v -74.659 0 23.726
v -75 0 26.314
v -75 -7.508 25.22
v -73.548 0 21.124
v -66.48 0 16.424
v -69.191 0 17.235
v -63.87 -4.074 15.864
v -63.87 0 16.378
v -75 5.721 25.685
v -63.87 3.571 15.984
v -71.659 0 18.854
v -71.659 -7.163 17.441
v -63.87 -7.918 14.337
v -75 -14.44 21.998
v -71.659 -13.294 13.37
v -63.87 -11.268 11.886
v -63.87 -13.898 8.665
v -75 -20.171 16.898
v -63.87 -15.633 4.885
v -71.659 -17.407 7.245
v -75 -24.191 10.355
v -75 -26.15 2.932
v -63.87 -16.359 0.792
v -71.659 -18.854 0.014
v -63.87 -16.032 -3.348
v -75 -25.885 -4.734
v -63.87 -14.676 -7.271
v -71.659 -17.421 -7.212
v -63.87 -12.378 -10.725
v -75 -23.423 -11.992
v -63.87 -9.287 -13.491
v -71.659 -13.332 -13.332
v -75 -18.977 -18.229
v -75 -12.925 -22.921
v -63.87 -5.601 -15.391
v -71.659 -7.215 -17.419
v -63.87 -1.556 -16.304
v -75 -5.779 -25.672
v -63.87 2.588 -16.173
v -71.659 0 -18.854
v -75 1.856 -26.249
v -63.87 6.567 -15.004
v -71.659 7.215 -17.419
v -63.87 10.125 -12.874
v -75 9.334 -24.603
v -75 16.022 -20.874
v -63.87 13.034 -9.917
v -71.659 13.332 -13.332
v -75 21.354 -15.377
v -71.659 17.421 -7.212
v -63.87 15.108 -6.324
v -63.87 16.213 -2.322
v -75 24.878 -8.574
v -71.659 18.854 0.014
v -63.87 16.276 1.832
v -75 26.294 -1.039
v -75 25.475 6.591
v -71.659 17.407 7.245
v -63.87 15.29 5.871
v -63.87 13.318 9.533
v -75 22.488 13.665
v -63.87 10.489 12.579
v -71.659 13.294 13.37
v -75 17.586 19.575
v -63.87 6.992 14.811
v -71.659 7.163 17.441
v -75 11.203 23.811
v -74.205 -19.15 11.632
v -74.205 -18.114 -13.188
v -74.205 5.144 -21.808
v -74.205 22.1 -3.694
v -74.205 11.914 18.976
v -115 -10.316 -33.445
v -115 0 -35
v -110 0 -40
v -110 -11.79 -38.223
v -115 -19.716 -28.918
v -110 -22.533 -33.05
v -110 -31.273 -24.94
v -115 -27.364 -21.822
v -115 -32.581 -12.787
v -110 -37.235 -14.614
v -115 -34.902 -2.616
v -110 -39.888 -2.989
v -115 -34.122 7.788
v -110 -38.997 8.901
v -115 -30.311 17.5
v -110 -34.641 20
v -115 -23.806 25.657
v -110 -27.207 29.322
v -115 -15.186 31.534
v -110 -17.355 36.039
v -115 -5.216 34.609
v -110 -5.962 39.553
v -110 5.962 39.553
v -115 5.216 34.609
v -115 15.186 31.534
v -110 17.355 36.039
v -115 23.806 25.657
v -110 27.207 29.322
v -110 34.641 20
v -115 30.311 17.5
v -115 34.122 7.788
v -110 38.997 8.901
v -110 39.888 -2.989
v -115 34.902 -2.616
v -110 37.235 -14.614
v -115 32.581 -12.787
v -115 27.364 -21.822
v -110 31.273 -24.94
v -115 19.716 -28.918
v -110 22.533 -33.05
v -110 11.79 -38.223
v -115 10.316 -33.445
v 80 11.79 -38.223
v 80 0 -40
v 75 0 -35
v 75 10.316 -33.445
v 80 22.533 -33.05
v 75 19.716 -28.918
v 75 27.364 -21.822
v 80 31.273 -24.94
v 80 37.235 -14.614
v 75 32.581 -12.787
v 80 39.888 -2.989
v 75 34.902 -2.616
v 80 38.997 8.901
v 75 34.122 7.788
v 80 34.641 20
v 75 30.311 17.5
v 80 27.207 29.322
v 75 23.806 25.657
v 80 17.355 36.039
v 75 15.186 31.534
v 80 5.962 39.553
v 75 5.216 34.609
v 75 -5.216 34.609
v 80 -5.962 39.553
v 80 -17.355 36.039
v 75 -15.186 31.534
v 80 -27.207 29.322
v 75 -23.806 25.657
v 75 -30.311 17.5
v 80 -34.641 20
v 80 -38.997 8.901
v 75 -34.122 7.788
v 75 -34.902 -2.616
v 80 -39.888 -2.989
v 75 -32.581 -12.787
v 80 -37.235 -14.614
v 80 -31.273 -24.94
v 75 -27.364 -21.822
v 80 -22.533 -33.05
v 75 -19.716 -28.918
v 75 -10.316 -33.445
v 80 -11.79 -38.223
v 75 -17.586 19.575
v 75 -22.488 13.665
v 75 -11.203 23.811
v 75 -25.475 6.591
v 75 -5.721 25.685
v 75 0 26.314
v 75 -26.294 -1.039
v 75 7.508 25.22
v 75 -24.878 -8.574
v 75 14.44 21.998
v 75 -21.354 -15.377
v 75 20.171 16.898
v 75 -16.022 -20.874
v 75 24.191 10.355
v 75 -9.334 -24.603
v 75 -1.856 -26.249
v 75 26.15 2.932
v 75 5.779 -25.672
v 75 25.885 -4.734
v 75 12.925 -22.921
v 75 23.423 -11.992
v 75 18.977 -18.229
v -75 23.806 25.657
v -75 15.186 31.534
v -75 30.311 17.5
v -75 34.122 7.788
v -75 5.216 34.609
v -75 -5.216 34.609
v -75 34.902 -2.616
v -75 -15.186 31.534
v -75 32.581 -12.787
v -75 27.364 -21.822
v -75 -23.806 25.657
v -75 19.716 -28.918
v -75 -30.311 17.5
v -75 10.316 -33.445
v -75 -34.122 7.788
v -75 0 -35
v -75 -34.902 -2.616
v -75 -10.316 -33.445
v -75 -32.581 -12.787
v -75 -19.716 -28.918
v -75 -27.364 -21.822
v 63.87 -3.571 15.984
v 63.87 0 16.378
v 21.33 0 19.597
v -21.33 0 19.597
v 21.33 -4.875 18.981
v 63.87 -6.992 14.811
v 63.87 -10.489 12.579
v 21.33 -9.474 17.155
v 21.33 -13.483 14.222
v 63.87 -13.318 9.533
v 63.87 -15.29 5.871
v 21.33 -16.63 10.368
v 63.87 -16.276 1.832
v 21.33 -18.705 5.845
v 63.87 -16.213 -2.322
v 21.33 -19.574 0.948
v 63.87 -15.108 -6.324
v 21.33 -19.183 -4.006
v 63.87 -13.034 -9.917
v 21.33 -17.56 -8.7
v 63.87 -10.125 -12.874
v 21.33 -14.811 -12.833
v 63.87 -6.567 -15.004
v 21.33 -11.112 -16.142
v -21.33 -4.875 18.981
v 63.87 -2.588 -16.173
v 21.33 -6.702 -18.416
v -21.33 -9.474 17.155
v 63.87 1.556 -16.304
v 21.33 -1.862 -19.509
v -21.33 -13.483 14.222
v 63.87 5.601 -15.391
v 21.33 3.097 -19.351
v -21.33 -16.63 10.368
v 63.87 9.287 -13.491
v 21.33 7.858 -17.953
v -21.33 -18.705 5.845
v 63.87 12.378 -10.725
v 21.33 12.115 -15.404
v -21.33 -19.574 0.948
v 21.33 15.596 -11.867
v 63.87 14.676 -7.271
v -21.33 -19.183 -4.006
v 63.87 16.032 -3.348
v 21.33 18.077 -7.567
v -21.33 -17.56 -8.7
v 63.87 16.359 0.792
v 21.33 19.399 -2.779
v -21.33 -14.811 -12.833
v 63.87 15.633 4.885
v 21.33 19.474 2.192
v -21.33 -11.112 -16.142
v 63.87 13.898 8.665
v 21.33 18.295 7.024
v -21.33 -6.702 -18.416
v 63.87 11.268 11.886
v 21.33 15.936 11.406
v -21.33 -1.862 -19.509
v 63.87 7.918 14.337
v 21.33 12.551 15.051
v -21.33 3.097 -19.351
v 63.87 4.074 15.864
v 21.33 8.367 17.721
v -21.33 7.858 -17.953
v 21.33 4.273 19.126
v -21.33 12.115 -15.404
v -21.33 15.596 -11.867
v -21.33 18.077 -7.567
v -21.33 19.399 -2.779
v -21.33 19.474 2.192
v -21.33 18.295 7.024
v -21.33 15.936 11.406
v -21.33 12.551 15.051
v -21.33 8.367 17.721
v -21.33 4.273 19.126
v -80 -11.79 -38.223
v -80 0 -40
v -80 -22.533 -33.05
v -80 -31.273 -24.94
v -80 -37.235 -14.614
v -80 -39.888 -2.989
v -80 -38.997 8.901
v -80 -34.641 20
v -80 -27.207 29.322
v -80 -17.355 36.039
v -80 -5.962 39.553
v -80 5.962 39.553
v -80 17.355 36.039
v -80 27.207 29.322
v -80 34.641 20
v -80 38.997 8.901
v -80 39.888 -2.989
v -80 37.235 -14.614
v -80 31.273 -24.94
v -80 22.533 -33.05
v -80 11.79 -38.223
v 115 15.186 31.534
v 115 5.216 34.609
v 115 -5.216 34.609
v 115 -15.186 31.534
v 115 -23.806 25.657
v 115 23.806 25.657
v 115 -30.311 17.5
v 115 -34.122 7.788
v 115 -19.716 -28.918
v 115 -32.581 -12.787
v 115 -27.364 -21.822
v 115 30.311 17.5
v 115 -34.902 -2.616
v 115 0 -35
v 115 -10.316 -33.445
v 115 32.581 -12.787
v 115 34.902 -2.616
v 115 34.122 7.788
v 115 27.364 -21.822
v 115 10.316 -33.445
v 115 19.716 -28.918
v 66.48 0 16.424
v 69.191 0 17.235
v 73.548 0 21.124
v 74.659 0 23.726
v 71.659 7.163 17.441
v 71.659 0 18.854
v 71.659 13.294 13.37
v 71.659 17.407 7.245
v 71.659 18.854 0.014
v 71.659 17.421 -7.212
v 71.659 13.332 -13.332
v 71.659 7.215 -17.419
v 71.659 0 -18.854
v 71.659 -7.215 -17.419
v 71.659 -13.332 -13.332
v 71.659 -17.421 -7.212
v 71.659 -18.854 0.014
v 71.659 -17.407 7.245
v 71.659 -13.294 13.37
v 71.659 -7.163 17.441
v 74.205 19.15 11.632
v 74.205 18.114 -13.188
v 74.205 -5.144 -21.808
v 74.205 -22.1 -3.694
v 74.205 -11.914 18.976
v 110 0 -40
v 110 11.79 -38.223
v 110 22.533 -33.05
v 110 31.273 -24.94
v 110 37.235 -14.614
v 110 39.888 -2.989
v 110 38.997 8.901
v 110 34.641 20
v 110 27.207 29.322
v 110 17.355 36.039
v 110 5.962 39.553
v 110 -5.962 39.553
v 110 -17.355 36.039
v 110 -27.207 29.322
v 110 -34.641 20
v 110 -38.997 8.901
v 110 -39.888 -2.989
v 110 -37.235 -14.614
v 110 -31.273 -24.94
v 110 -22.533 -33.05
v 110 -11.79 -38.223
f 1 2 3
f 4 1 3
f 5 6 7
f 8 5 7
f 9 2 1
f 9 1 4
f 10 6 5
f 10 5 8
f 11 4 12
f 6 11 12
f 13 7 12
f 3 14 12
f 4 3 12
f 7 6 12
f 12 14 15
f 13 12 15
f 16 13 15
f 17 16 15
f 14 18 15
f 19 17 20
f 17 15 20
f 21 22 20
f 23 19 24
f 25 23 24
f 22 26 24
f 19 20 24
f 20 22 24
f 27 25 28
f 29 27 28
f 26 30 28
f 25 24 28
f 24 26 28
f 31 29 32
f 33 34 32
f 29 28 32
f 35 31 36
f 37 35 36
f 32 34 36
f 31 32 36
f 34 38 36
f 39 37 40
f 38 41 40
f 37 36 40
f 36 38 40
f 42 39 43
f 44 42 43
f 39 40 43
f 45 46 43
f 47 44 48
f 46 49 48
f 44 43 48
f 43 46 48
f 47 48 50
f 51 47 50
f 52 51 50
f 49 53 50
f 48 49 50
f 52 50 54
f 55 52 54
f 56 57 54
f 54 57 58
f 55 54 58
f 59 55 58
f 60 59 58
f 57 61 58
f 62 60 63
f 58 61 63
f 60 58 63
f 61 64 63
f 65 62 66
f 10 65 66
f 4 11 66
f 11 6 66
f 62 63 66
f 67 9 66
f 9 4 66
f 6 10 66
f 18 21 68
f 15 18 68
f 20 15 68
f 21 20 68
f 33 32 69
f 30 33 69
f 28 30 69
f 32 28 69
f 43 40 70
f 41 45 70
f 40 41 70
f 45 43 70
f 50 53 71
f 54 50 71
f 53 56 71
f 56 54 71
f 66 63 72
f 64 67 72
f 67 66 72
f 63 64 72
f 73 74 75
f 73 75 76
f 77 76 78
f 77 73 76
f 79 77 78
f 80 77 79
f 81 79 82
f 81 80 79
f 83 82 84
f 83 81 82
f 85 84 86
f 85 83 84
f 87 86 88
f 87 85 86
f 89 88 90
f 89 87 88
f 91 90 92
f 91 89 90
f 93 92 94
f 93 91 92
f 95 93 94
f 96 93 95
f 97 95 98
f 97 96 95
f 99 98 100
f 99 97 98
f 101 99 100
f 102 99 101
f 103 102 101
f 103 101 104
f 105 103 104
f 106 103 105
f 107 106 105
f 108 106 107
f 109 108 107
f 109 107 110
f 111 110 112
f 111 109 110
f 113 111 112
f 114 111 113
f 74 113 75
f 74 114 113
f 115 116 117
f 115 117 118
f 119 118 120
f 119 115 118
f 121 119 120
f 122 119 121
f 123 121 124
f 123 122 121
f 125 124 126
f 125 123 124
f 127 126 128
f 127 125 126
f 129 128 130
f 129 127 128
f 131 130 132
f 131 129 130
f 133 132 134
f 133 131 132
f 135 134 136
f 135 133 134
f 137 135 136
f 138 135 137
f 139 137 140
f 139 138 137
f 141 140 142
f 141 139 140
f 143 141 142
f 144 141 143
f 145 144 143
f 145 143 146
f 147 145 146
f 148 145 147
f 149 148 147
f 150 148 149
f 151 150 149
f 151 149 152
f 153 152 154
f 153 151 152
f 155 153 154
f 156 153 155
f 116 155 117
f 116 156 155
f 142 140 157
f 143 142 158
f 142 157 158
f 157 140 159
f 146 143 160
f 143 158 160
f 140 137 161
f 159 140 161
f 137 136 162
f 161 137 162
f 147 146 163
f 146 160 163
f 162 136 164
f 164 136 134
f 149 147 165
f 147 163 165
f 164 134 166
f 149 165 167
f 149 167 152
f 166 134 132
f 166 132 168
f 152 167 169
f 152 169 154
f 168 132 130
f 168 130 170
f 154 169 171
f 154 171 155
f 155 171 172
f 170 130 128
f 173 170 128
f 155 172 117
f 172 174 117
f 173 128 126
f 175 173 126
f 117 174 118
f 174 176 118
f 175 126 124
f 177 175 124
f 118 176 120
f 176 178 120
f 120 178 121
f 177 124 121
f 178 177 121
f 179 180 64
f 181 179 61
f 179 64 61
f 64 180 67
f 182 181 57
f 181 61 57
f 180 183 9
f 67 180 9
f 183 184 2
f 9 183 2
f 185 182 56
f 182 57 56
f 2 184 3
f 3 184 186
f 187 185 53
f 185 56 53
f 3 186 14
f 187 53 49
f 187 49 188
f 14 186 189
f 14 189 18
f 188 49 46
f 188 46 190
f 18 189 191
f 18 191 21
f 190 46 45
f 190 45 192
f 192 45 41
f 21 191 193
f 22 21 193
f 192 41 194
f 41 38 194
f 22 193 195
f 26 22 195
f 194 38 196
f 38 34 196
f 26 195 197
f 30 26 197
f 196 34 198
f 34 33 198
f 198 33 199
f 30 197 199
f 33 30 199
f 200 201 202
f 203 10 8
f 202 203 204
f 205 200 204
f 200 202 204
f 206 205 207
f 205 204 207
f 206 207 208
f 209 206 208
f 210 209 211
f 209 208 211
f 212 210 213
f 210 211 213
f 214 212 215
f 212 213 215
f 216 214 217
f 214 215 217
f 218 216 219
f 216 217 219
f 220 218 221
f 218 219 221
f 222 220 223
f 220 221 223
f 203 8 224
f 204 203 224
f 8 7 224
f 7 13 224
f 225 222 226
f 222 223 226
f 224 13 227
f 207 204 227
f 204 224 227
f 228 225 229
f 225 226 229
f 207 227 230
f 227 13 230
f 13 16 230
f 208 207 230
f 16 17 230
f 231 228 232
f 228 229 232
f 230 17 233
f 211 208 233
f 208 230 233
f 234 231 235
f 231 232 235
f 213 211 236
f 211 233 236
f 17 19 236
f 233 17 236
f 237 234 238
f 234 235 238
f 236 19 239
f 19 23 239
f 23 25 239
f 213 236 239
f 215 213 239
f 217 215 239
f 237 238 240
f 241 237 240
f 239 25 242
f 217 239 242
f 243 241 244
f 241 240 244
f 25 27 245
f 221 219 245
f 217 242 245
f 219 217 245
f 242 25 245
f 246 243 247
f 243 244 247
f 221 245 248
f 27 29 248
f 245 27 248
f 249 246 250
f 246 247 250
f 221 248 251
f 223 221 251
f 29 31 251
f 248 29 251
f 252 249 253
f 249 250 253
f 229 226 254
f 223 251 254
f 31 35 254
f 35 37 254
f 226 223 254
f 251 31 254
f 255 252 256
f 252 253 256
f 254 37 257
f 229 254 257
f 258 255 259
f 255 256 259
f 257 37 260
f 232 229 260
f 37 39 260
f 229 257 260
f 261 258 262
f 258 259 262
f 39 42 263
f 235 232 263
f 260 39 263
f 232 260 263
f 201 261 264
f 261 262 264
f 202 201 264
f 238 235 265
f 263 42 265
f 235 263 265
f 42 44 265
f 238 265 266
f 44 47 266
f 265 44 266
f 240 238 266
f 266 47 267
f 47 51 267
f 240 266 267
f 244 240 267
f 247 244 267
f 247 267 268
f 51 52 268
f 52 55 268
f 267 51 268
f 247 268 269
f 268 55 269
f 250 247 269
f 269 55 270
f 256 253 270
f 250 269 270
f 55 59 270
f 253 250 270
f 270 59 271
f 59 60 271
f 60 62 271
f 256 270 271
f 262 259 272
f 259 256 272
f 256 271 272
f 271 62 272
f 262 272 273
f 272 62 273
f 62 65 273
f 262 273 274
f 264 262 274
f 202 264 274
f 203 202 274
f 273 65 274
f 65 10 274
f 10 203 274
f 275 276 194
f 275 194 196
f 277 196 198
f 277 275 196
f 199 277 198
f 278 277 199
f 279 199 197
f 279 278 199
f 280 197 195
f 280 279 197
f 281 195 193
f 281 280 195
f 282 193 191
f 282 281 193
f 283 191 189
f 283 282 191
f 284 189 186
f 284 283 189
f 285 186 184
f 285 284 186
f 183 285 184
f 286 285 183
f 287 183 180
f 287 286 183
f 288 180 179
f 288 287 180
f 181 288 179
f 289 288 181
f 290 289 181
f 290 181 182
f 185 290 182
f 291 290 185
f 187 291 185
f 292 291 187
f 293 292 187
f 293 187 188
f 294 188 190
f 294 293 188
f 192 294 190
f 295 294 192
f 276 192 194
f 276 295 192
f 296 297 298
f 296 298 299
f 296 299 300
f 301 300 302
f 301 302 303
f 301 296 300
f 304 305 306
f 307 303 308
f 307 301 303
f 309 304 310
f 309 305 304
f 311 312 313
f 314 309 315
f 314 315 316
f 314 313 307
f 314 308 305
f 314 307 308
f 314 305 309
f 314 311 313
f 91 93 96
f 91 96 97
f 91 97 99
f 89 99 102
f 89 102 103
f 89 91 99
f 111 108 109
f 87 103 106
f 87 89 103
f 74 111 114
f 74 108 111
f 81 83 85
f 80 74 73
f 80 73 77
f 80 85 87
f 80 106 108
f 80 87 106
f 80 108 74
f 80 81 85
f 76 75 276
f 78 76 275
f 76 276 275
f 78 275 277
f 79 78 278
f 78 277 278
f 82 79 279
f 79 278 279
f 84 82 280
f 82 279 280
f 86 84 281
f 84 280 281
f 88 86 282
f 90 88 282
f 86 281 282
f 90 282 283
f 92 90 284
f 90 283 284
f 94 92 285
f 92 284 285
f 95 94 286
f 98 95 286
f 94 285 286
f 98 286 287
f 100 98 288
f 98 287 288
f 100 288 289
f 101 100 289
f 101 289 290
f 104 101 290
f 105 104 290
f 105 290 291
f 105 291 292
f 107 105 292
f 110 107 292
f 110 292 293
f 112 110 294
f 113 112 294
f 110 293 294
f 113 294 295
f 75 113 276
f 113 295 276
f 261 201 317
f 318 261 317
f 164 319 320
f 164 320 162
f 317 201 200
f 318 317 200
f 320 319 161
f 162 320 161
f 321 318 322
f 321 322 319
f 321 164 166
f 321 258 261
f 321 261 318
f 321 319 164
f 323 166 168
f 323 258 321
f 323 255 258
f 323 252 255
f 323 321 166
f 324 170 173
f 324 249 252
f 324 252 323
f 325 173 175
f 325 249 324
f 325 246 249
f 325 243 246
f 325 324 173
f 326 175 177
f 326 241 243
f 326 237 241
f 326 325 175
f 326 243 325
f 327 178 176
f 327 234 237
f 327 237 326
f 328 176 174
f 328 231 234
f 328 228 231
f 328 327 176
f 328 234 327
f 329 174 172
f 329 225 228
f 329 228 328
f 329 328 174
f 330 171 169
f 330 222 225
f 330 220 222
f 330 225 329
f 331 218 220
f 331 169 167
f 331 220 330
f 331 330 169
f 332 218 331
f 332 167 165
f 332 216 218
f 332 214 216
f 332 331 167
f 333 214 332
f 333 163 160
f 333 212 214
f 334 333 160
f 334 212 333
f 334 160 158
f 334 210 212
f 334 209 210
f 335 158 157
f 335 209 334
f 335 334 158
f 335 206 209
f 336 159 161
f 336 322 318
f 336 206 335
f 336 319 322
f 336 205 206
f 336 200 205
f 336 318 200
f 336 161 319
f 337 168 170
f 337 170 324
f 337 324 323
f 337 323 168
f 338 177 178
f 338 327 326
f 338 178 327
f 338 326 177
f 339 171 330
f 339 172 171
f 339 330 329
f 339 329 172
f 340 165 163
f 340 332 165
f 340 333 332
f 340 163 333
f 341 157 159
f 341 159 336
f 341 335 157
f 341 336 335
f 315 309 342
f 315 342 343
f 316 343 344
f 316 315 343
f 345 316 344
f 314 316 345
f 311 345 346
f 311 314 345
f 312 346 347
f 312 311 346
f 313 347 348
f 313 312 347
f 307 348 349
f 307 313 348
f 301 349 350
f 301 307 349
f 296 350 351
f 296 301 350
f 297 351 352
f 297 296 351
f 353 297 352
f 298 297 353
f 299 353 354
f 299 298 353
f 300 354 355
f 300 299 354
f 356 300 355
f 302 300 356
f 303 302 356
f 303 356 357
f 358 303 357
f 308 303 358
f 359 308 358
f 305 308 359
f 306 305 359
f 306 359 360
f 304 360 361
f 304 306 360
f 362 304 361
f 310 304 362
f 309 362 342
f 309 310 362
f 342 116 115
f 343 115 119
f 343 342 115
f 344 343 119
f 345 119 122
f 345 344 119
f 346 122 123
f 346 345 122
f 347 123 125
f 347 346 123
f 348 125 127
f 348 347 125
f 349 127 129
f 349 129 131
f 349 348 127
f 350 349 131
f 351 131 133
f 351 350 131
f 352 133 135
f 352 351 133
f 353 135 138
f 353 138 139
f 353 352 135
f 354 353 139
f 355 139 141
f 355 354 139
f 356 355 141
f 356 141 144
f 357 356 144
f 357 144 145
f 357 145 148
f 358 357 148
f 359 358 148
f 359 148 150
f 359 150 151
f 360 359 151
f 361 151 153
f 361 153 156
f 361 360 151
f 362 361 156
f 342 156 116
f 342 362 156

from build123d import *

# Parameters (mm, degrees)
SKETCH1_R           = 15
BOSS_EXTRUDE1_DEPTH = 115
SKETCH2_R           = 40
BOSS_EXTRUDE2_DEPTH = 40
BOSS_EXTRUDE3_START = -40
SKETCH3_R           = 40
BOSS_EXTRUDE3_DEPTH = 40
CHAMFER1_SIZE       = 5
FILLET1_R           = 10


with BuildPart() as part:
    # Sketch1 → Boss-Extrude1 (new, symmetric)
    with BuildSketch(Plane(origin=(0, 0, 0), x_dir=(0, 0, -1), z_dir=(1, 0, 0))):
        Circle(SKETCH1_R)
    extrude(amount=BOSS_EXTRUDE1_DEPTH, both=True)

    # Sketch2 → Boss-Extrude2 (add)
    with BuildSketch(Plane(origin=(115, 0, 0), x_dir=(0, 0, -1), z_dir=(1, 0, 0))):
        Circle(SKETCH2_R)
    extrude(amount=-BOSS_EXTRUDE2_DEPTH)

    # Sketch3 → Boss-Extrude3 (add)
    with BuildSketch(Plane.ZY.offset(115).offset(BOSS_EXTRUDE3_START)):
        with Locations(Location((0, 0, 0), (0, 0, 180))):
            Circle(SKETCH3_R)
    extrude(amount=BOSS_EXTRUDE3_DEPTH)

    # Sketch5 → Revolve1 (revolve)
    with BuildSketch(Plane.XY, mode=Mode.PRIVATE) as revolve1_sk:
        with BuildLine():
            Line((-75, 15), (75, 15))
            ThreePointArc((75, 15), (0, 20), (-75, 15))
        make_face()
    revolve(revolve1_sk.sketch.rotate(Axis((-125.396729405, 0, 0), (1, 0, 0)), 90), axis=Axis((-125.396729405, 0, 0), (1, 0, 0)))

    # Chamfer1
    chamfer1_edges = [part.edges().sort_by_distance(p)[0] for p in [
        (-75, 0, 40),
        (-115, 0, 40),
        (75, 0, 40),
        (115, 0, 40),
    ]]
    chamfer(chamfer1_edges, length=CHAMFER1_SIZE)

    # Fillet1
    fillet1_edges = [part.edges().sort_by_distance(p)[0] for p in [
        (75, 0, -15),
        (-75, 0, -15),
    ]]
    fillet(fillet1_edges, radius=FILLET1_R)


solid = part.part
